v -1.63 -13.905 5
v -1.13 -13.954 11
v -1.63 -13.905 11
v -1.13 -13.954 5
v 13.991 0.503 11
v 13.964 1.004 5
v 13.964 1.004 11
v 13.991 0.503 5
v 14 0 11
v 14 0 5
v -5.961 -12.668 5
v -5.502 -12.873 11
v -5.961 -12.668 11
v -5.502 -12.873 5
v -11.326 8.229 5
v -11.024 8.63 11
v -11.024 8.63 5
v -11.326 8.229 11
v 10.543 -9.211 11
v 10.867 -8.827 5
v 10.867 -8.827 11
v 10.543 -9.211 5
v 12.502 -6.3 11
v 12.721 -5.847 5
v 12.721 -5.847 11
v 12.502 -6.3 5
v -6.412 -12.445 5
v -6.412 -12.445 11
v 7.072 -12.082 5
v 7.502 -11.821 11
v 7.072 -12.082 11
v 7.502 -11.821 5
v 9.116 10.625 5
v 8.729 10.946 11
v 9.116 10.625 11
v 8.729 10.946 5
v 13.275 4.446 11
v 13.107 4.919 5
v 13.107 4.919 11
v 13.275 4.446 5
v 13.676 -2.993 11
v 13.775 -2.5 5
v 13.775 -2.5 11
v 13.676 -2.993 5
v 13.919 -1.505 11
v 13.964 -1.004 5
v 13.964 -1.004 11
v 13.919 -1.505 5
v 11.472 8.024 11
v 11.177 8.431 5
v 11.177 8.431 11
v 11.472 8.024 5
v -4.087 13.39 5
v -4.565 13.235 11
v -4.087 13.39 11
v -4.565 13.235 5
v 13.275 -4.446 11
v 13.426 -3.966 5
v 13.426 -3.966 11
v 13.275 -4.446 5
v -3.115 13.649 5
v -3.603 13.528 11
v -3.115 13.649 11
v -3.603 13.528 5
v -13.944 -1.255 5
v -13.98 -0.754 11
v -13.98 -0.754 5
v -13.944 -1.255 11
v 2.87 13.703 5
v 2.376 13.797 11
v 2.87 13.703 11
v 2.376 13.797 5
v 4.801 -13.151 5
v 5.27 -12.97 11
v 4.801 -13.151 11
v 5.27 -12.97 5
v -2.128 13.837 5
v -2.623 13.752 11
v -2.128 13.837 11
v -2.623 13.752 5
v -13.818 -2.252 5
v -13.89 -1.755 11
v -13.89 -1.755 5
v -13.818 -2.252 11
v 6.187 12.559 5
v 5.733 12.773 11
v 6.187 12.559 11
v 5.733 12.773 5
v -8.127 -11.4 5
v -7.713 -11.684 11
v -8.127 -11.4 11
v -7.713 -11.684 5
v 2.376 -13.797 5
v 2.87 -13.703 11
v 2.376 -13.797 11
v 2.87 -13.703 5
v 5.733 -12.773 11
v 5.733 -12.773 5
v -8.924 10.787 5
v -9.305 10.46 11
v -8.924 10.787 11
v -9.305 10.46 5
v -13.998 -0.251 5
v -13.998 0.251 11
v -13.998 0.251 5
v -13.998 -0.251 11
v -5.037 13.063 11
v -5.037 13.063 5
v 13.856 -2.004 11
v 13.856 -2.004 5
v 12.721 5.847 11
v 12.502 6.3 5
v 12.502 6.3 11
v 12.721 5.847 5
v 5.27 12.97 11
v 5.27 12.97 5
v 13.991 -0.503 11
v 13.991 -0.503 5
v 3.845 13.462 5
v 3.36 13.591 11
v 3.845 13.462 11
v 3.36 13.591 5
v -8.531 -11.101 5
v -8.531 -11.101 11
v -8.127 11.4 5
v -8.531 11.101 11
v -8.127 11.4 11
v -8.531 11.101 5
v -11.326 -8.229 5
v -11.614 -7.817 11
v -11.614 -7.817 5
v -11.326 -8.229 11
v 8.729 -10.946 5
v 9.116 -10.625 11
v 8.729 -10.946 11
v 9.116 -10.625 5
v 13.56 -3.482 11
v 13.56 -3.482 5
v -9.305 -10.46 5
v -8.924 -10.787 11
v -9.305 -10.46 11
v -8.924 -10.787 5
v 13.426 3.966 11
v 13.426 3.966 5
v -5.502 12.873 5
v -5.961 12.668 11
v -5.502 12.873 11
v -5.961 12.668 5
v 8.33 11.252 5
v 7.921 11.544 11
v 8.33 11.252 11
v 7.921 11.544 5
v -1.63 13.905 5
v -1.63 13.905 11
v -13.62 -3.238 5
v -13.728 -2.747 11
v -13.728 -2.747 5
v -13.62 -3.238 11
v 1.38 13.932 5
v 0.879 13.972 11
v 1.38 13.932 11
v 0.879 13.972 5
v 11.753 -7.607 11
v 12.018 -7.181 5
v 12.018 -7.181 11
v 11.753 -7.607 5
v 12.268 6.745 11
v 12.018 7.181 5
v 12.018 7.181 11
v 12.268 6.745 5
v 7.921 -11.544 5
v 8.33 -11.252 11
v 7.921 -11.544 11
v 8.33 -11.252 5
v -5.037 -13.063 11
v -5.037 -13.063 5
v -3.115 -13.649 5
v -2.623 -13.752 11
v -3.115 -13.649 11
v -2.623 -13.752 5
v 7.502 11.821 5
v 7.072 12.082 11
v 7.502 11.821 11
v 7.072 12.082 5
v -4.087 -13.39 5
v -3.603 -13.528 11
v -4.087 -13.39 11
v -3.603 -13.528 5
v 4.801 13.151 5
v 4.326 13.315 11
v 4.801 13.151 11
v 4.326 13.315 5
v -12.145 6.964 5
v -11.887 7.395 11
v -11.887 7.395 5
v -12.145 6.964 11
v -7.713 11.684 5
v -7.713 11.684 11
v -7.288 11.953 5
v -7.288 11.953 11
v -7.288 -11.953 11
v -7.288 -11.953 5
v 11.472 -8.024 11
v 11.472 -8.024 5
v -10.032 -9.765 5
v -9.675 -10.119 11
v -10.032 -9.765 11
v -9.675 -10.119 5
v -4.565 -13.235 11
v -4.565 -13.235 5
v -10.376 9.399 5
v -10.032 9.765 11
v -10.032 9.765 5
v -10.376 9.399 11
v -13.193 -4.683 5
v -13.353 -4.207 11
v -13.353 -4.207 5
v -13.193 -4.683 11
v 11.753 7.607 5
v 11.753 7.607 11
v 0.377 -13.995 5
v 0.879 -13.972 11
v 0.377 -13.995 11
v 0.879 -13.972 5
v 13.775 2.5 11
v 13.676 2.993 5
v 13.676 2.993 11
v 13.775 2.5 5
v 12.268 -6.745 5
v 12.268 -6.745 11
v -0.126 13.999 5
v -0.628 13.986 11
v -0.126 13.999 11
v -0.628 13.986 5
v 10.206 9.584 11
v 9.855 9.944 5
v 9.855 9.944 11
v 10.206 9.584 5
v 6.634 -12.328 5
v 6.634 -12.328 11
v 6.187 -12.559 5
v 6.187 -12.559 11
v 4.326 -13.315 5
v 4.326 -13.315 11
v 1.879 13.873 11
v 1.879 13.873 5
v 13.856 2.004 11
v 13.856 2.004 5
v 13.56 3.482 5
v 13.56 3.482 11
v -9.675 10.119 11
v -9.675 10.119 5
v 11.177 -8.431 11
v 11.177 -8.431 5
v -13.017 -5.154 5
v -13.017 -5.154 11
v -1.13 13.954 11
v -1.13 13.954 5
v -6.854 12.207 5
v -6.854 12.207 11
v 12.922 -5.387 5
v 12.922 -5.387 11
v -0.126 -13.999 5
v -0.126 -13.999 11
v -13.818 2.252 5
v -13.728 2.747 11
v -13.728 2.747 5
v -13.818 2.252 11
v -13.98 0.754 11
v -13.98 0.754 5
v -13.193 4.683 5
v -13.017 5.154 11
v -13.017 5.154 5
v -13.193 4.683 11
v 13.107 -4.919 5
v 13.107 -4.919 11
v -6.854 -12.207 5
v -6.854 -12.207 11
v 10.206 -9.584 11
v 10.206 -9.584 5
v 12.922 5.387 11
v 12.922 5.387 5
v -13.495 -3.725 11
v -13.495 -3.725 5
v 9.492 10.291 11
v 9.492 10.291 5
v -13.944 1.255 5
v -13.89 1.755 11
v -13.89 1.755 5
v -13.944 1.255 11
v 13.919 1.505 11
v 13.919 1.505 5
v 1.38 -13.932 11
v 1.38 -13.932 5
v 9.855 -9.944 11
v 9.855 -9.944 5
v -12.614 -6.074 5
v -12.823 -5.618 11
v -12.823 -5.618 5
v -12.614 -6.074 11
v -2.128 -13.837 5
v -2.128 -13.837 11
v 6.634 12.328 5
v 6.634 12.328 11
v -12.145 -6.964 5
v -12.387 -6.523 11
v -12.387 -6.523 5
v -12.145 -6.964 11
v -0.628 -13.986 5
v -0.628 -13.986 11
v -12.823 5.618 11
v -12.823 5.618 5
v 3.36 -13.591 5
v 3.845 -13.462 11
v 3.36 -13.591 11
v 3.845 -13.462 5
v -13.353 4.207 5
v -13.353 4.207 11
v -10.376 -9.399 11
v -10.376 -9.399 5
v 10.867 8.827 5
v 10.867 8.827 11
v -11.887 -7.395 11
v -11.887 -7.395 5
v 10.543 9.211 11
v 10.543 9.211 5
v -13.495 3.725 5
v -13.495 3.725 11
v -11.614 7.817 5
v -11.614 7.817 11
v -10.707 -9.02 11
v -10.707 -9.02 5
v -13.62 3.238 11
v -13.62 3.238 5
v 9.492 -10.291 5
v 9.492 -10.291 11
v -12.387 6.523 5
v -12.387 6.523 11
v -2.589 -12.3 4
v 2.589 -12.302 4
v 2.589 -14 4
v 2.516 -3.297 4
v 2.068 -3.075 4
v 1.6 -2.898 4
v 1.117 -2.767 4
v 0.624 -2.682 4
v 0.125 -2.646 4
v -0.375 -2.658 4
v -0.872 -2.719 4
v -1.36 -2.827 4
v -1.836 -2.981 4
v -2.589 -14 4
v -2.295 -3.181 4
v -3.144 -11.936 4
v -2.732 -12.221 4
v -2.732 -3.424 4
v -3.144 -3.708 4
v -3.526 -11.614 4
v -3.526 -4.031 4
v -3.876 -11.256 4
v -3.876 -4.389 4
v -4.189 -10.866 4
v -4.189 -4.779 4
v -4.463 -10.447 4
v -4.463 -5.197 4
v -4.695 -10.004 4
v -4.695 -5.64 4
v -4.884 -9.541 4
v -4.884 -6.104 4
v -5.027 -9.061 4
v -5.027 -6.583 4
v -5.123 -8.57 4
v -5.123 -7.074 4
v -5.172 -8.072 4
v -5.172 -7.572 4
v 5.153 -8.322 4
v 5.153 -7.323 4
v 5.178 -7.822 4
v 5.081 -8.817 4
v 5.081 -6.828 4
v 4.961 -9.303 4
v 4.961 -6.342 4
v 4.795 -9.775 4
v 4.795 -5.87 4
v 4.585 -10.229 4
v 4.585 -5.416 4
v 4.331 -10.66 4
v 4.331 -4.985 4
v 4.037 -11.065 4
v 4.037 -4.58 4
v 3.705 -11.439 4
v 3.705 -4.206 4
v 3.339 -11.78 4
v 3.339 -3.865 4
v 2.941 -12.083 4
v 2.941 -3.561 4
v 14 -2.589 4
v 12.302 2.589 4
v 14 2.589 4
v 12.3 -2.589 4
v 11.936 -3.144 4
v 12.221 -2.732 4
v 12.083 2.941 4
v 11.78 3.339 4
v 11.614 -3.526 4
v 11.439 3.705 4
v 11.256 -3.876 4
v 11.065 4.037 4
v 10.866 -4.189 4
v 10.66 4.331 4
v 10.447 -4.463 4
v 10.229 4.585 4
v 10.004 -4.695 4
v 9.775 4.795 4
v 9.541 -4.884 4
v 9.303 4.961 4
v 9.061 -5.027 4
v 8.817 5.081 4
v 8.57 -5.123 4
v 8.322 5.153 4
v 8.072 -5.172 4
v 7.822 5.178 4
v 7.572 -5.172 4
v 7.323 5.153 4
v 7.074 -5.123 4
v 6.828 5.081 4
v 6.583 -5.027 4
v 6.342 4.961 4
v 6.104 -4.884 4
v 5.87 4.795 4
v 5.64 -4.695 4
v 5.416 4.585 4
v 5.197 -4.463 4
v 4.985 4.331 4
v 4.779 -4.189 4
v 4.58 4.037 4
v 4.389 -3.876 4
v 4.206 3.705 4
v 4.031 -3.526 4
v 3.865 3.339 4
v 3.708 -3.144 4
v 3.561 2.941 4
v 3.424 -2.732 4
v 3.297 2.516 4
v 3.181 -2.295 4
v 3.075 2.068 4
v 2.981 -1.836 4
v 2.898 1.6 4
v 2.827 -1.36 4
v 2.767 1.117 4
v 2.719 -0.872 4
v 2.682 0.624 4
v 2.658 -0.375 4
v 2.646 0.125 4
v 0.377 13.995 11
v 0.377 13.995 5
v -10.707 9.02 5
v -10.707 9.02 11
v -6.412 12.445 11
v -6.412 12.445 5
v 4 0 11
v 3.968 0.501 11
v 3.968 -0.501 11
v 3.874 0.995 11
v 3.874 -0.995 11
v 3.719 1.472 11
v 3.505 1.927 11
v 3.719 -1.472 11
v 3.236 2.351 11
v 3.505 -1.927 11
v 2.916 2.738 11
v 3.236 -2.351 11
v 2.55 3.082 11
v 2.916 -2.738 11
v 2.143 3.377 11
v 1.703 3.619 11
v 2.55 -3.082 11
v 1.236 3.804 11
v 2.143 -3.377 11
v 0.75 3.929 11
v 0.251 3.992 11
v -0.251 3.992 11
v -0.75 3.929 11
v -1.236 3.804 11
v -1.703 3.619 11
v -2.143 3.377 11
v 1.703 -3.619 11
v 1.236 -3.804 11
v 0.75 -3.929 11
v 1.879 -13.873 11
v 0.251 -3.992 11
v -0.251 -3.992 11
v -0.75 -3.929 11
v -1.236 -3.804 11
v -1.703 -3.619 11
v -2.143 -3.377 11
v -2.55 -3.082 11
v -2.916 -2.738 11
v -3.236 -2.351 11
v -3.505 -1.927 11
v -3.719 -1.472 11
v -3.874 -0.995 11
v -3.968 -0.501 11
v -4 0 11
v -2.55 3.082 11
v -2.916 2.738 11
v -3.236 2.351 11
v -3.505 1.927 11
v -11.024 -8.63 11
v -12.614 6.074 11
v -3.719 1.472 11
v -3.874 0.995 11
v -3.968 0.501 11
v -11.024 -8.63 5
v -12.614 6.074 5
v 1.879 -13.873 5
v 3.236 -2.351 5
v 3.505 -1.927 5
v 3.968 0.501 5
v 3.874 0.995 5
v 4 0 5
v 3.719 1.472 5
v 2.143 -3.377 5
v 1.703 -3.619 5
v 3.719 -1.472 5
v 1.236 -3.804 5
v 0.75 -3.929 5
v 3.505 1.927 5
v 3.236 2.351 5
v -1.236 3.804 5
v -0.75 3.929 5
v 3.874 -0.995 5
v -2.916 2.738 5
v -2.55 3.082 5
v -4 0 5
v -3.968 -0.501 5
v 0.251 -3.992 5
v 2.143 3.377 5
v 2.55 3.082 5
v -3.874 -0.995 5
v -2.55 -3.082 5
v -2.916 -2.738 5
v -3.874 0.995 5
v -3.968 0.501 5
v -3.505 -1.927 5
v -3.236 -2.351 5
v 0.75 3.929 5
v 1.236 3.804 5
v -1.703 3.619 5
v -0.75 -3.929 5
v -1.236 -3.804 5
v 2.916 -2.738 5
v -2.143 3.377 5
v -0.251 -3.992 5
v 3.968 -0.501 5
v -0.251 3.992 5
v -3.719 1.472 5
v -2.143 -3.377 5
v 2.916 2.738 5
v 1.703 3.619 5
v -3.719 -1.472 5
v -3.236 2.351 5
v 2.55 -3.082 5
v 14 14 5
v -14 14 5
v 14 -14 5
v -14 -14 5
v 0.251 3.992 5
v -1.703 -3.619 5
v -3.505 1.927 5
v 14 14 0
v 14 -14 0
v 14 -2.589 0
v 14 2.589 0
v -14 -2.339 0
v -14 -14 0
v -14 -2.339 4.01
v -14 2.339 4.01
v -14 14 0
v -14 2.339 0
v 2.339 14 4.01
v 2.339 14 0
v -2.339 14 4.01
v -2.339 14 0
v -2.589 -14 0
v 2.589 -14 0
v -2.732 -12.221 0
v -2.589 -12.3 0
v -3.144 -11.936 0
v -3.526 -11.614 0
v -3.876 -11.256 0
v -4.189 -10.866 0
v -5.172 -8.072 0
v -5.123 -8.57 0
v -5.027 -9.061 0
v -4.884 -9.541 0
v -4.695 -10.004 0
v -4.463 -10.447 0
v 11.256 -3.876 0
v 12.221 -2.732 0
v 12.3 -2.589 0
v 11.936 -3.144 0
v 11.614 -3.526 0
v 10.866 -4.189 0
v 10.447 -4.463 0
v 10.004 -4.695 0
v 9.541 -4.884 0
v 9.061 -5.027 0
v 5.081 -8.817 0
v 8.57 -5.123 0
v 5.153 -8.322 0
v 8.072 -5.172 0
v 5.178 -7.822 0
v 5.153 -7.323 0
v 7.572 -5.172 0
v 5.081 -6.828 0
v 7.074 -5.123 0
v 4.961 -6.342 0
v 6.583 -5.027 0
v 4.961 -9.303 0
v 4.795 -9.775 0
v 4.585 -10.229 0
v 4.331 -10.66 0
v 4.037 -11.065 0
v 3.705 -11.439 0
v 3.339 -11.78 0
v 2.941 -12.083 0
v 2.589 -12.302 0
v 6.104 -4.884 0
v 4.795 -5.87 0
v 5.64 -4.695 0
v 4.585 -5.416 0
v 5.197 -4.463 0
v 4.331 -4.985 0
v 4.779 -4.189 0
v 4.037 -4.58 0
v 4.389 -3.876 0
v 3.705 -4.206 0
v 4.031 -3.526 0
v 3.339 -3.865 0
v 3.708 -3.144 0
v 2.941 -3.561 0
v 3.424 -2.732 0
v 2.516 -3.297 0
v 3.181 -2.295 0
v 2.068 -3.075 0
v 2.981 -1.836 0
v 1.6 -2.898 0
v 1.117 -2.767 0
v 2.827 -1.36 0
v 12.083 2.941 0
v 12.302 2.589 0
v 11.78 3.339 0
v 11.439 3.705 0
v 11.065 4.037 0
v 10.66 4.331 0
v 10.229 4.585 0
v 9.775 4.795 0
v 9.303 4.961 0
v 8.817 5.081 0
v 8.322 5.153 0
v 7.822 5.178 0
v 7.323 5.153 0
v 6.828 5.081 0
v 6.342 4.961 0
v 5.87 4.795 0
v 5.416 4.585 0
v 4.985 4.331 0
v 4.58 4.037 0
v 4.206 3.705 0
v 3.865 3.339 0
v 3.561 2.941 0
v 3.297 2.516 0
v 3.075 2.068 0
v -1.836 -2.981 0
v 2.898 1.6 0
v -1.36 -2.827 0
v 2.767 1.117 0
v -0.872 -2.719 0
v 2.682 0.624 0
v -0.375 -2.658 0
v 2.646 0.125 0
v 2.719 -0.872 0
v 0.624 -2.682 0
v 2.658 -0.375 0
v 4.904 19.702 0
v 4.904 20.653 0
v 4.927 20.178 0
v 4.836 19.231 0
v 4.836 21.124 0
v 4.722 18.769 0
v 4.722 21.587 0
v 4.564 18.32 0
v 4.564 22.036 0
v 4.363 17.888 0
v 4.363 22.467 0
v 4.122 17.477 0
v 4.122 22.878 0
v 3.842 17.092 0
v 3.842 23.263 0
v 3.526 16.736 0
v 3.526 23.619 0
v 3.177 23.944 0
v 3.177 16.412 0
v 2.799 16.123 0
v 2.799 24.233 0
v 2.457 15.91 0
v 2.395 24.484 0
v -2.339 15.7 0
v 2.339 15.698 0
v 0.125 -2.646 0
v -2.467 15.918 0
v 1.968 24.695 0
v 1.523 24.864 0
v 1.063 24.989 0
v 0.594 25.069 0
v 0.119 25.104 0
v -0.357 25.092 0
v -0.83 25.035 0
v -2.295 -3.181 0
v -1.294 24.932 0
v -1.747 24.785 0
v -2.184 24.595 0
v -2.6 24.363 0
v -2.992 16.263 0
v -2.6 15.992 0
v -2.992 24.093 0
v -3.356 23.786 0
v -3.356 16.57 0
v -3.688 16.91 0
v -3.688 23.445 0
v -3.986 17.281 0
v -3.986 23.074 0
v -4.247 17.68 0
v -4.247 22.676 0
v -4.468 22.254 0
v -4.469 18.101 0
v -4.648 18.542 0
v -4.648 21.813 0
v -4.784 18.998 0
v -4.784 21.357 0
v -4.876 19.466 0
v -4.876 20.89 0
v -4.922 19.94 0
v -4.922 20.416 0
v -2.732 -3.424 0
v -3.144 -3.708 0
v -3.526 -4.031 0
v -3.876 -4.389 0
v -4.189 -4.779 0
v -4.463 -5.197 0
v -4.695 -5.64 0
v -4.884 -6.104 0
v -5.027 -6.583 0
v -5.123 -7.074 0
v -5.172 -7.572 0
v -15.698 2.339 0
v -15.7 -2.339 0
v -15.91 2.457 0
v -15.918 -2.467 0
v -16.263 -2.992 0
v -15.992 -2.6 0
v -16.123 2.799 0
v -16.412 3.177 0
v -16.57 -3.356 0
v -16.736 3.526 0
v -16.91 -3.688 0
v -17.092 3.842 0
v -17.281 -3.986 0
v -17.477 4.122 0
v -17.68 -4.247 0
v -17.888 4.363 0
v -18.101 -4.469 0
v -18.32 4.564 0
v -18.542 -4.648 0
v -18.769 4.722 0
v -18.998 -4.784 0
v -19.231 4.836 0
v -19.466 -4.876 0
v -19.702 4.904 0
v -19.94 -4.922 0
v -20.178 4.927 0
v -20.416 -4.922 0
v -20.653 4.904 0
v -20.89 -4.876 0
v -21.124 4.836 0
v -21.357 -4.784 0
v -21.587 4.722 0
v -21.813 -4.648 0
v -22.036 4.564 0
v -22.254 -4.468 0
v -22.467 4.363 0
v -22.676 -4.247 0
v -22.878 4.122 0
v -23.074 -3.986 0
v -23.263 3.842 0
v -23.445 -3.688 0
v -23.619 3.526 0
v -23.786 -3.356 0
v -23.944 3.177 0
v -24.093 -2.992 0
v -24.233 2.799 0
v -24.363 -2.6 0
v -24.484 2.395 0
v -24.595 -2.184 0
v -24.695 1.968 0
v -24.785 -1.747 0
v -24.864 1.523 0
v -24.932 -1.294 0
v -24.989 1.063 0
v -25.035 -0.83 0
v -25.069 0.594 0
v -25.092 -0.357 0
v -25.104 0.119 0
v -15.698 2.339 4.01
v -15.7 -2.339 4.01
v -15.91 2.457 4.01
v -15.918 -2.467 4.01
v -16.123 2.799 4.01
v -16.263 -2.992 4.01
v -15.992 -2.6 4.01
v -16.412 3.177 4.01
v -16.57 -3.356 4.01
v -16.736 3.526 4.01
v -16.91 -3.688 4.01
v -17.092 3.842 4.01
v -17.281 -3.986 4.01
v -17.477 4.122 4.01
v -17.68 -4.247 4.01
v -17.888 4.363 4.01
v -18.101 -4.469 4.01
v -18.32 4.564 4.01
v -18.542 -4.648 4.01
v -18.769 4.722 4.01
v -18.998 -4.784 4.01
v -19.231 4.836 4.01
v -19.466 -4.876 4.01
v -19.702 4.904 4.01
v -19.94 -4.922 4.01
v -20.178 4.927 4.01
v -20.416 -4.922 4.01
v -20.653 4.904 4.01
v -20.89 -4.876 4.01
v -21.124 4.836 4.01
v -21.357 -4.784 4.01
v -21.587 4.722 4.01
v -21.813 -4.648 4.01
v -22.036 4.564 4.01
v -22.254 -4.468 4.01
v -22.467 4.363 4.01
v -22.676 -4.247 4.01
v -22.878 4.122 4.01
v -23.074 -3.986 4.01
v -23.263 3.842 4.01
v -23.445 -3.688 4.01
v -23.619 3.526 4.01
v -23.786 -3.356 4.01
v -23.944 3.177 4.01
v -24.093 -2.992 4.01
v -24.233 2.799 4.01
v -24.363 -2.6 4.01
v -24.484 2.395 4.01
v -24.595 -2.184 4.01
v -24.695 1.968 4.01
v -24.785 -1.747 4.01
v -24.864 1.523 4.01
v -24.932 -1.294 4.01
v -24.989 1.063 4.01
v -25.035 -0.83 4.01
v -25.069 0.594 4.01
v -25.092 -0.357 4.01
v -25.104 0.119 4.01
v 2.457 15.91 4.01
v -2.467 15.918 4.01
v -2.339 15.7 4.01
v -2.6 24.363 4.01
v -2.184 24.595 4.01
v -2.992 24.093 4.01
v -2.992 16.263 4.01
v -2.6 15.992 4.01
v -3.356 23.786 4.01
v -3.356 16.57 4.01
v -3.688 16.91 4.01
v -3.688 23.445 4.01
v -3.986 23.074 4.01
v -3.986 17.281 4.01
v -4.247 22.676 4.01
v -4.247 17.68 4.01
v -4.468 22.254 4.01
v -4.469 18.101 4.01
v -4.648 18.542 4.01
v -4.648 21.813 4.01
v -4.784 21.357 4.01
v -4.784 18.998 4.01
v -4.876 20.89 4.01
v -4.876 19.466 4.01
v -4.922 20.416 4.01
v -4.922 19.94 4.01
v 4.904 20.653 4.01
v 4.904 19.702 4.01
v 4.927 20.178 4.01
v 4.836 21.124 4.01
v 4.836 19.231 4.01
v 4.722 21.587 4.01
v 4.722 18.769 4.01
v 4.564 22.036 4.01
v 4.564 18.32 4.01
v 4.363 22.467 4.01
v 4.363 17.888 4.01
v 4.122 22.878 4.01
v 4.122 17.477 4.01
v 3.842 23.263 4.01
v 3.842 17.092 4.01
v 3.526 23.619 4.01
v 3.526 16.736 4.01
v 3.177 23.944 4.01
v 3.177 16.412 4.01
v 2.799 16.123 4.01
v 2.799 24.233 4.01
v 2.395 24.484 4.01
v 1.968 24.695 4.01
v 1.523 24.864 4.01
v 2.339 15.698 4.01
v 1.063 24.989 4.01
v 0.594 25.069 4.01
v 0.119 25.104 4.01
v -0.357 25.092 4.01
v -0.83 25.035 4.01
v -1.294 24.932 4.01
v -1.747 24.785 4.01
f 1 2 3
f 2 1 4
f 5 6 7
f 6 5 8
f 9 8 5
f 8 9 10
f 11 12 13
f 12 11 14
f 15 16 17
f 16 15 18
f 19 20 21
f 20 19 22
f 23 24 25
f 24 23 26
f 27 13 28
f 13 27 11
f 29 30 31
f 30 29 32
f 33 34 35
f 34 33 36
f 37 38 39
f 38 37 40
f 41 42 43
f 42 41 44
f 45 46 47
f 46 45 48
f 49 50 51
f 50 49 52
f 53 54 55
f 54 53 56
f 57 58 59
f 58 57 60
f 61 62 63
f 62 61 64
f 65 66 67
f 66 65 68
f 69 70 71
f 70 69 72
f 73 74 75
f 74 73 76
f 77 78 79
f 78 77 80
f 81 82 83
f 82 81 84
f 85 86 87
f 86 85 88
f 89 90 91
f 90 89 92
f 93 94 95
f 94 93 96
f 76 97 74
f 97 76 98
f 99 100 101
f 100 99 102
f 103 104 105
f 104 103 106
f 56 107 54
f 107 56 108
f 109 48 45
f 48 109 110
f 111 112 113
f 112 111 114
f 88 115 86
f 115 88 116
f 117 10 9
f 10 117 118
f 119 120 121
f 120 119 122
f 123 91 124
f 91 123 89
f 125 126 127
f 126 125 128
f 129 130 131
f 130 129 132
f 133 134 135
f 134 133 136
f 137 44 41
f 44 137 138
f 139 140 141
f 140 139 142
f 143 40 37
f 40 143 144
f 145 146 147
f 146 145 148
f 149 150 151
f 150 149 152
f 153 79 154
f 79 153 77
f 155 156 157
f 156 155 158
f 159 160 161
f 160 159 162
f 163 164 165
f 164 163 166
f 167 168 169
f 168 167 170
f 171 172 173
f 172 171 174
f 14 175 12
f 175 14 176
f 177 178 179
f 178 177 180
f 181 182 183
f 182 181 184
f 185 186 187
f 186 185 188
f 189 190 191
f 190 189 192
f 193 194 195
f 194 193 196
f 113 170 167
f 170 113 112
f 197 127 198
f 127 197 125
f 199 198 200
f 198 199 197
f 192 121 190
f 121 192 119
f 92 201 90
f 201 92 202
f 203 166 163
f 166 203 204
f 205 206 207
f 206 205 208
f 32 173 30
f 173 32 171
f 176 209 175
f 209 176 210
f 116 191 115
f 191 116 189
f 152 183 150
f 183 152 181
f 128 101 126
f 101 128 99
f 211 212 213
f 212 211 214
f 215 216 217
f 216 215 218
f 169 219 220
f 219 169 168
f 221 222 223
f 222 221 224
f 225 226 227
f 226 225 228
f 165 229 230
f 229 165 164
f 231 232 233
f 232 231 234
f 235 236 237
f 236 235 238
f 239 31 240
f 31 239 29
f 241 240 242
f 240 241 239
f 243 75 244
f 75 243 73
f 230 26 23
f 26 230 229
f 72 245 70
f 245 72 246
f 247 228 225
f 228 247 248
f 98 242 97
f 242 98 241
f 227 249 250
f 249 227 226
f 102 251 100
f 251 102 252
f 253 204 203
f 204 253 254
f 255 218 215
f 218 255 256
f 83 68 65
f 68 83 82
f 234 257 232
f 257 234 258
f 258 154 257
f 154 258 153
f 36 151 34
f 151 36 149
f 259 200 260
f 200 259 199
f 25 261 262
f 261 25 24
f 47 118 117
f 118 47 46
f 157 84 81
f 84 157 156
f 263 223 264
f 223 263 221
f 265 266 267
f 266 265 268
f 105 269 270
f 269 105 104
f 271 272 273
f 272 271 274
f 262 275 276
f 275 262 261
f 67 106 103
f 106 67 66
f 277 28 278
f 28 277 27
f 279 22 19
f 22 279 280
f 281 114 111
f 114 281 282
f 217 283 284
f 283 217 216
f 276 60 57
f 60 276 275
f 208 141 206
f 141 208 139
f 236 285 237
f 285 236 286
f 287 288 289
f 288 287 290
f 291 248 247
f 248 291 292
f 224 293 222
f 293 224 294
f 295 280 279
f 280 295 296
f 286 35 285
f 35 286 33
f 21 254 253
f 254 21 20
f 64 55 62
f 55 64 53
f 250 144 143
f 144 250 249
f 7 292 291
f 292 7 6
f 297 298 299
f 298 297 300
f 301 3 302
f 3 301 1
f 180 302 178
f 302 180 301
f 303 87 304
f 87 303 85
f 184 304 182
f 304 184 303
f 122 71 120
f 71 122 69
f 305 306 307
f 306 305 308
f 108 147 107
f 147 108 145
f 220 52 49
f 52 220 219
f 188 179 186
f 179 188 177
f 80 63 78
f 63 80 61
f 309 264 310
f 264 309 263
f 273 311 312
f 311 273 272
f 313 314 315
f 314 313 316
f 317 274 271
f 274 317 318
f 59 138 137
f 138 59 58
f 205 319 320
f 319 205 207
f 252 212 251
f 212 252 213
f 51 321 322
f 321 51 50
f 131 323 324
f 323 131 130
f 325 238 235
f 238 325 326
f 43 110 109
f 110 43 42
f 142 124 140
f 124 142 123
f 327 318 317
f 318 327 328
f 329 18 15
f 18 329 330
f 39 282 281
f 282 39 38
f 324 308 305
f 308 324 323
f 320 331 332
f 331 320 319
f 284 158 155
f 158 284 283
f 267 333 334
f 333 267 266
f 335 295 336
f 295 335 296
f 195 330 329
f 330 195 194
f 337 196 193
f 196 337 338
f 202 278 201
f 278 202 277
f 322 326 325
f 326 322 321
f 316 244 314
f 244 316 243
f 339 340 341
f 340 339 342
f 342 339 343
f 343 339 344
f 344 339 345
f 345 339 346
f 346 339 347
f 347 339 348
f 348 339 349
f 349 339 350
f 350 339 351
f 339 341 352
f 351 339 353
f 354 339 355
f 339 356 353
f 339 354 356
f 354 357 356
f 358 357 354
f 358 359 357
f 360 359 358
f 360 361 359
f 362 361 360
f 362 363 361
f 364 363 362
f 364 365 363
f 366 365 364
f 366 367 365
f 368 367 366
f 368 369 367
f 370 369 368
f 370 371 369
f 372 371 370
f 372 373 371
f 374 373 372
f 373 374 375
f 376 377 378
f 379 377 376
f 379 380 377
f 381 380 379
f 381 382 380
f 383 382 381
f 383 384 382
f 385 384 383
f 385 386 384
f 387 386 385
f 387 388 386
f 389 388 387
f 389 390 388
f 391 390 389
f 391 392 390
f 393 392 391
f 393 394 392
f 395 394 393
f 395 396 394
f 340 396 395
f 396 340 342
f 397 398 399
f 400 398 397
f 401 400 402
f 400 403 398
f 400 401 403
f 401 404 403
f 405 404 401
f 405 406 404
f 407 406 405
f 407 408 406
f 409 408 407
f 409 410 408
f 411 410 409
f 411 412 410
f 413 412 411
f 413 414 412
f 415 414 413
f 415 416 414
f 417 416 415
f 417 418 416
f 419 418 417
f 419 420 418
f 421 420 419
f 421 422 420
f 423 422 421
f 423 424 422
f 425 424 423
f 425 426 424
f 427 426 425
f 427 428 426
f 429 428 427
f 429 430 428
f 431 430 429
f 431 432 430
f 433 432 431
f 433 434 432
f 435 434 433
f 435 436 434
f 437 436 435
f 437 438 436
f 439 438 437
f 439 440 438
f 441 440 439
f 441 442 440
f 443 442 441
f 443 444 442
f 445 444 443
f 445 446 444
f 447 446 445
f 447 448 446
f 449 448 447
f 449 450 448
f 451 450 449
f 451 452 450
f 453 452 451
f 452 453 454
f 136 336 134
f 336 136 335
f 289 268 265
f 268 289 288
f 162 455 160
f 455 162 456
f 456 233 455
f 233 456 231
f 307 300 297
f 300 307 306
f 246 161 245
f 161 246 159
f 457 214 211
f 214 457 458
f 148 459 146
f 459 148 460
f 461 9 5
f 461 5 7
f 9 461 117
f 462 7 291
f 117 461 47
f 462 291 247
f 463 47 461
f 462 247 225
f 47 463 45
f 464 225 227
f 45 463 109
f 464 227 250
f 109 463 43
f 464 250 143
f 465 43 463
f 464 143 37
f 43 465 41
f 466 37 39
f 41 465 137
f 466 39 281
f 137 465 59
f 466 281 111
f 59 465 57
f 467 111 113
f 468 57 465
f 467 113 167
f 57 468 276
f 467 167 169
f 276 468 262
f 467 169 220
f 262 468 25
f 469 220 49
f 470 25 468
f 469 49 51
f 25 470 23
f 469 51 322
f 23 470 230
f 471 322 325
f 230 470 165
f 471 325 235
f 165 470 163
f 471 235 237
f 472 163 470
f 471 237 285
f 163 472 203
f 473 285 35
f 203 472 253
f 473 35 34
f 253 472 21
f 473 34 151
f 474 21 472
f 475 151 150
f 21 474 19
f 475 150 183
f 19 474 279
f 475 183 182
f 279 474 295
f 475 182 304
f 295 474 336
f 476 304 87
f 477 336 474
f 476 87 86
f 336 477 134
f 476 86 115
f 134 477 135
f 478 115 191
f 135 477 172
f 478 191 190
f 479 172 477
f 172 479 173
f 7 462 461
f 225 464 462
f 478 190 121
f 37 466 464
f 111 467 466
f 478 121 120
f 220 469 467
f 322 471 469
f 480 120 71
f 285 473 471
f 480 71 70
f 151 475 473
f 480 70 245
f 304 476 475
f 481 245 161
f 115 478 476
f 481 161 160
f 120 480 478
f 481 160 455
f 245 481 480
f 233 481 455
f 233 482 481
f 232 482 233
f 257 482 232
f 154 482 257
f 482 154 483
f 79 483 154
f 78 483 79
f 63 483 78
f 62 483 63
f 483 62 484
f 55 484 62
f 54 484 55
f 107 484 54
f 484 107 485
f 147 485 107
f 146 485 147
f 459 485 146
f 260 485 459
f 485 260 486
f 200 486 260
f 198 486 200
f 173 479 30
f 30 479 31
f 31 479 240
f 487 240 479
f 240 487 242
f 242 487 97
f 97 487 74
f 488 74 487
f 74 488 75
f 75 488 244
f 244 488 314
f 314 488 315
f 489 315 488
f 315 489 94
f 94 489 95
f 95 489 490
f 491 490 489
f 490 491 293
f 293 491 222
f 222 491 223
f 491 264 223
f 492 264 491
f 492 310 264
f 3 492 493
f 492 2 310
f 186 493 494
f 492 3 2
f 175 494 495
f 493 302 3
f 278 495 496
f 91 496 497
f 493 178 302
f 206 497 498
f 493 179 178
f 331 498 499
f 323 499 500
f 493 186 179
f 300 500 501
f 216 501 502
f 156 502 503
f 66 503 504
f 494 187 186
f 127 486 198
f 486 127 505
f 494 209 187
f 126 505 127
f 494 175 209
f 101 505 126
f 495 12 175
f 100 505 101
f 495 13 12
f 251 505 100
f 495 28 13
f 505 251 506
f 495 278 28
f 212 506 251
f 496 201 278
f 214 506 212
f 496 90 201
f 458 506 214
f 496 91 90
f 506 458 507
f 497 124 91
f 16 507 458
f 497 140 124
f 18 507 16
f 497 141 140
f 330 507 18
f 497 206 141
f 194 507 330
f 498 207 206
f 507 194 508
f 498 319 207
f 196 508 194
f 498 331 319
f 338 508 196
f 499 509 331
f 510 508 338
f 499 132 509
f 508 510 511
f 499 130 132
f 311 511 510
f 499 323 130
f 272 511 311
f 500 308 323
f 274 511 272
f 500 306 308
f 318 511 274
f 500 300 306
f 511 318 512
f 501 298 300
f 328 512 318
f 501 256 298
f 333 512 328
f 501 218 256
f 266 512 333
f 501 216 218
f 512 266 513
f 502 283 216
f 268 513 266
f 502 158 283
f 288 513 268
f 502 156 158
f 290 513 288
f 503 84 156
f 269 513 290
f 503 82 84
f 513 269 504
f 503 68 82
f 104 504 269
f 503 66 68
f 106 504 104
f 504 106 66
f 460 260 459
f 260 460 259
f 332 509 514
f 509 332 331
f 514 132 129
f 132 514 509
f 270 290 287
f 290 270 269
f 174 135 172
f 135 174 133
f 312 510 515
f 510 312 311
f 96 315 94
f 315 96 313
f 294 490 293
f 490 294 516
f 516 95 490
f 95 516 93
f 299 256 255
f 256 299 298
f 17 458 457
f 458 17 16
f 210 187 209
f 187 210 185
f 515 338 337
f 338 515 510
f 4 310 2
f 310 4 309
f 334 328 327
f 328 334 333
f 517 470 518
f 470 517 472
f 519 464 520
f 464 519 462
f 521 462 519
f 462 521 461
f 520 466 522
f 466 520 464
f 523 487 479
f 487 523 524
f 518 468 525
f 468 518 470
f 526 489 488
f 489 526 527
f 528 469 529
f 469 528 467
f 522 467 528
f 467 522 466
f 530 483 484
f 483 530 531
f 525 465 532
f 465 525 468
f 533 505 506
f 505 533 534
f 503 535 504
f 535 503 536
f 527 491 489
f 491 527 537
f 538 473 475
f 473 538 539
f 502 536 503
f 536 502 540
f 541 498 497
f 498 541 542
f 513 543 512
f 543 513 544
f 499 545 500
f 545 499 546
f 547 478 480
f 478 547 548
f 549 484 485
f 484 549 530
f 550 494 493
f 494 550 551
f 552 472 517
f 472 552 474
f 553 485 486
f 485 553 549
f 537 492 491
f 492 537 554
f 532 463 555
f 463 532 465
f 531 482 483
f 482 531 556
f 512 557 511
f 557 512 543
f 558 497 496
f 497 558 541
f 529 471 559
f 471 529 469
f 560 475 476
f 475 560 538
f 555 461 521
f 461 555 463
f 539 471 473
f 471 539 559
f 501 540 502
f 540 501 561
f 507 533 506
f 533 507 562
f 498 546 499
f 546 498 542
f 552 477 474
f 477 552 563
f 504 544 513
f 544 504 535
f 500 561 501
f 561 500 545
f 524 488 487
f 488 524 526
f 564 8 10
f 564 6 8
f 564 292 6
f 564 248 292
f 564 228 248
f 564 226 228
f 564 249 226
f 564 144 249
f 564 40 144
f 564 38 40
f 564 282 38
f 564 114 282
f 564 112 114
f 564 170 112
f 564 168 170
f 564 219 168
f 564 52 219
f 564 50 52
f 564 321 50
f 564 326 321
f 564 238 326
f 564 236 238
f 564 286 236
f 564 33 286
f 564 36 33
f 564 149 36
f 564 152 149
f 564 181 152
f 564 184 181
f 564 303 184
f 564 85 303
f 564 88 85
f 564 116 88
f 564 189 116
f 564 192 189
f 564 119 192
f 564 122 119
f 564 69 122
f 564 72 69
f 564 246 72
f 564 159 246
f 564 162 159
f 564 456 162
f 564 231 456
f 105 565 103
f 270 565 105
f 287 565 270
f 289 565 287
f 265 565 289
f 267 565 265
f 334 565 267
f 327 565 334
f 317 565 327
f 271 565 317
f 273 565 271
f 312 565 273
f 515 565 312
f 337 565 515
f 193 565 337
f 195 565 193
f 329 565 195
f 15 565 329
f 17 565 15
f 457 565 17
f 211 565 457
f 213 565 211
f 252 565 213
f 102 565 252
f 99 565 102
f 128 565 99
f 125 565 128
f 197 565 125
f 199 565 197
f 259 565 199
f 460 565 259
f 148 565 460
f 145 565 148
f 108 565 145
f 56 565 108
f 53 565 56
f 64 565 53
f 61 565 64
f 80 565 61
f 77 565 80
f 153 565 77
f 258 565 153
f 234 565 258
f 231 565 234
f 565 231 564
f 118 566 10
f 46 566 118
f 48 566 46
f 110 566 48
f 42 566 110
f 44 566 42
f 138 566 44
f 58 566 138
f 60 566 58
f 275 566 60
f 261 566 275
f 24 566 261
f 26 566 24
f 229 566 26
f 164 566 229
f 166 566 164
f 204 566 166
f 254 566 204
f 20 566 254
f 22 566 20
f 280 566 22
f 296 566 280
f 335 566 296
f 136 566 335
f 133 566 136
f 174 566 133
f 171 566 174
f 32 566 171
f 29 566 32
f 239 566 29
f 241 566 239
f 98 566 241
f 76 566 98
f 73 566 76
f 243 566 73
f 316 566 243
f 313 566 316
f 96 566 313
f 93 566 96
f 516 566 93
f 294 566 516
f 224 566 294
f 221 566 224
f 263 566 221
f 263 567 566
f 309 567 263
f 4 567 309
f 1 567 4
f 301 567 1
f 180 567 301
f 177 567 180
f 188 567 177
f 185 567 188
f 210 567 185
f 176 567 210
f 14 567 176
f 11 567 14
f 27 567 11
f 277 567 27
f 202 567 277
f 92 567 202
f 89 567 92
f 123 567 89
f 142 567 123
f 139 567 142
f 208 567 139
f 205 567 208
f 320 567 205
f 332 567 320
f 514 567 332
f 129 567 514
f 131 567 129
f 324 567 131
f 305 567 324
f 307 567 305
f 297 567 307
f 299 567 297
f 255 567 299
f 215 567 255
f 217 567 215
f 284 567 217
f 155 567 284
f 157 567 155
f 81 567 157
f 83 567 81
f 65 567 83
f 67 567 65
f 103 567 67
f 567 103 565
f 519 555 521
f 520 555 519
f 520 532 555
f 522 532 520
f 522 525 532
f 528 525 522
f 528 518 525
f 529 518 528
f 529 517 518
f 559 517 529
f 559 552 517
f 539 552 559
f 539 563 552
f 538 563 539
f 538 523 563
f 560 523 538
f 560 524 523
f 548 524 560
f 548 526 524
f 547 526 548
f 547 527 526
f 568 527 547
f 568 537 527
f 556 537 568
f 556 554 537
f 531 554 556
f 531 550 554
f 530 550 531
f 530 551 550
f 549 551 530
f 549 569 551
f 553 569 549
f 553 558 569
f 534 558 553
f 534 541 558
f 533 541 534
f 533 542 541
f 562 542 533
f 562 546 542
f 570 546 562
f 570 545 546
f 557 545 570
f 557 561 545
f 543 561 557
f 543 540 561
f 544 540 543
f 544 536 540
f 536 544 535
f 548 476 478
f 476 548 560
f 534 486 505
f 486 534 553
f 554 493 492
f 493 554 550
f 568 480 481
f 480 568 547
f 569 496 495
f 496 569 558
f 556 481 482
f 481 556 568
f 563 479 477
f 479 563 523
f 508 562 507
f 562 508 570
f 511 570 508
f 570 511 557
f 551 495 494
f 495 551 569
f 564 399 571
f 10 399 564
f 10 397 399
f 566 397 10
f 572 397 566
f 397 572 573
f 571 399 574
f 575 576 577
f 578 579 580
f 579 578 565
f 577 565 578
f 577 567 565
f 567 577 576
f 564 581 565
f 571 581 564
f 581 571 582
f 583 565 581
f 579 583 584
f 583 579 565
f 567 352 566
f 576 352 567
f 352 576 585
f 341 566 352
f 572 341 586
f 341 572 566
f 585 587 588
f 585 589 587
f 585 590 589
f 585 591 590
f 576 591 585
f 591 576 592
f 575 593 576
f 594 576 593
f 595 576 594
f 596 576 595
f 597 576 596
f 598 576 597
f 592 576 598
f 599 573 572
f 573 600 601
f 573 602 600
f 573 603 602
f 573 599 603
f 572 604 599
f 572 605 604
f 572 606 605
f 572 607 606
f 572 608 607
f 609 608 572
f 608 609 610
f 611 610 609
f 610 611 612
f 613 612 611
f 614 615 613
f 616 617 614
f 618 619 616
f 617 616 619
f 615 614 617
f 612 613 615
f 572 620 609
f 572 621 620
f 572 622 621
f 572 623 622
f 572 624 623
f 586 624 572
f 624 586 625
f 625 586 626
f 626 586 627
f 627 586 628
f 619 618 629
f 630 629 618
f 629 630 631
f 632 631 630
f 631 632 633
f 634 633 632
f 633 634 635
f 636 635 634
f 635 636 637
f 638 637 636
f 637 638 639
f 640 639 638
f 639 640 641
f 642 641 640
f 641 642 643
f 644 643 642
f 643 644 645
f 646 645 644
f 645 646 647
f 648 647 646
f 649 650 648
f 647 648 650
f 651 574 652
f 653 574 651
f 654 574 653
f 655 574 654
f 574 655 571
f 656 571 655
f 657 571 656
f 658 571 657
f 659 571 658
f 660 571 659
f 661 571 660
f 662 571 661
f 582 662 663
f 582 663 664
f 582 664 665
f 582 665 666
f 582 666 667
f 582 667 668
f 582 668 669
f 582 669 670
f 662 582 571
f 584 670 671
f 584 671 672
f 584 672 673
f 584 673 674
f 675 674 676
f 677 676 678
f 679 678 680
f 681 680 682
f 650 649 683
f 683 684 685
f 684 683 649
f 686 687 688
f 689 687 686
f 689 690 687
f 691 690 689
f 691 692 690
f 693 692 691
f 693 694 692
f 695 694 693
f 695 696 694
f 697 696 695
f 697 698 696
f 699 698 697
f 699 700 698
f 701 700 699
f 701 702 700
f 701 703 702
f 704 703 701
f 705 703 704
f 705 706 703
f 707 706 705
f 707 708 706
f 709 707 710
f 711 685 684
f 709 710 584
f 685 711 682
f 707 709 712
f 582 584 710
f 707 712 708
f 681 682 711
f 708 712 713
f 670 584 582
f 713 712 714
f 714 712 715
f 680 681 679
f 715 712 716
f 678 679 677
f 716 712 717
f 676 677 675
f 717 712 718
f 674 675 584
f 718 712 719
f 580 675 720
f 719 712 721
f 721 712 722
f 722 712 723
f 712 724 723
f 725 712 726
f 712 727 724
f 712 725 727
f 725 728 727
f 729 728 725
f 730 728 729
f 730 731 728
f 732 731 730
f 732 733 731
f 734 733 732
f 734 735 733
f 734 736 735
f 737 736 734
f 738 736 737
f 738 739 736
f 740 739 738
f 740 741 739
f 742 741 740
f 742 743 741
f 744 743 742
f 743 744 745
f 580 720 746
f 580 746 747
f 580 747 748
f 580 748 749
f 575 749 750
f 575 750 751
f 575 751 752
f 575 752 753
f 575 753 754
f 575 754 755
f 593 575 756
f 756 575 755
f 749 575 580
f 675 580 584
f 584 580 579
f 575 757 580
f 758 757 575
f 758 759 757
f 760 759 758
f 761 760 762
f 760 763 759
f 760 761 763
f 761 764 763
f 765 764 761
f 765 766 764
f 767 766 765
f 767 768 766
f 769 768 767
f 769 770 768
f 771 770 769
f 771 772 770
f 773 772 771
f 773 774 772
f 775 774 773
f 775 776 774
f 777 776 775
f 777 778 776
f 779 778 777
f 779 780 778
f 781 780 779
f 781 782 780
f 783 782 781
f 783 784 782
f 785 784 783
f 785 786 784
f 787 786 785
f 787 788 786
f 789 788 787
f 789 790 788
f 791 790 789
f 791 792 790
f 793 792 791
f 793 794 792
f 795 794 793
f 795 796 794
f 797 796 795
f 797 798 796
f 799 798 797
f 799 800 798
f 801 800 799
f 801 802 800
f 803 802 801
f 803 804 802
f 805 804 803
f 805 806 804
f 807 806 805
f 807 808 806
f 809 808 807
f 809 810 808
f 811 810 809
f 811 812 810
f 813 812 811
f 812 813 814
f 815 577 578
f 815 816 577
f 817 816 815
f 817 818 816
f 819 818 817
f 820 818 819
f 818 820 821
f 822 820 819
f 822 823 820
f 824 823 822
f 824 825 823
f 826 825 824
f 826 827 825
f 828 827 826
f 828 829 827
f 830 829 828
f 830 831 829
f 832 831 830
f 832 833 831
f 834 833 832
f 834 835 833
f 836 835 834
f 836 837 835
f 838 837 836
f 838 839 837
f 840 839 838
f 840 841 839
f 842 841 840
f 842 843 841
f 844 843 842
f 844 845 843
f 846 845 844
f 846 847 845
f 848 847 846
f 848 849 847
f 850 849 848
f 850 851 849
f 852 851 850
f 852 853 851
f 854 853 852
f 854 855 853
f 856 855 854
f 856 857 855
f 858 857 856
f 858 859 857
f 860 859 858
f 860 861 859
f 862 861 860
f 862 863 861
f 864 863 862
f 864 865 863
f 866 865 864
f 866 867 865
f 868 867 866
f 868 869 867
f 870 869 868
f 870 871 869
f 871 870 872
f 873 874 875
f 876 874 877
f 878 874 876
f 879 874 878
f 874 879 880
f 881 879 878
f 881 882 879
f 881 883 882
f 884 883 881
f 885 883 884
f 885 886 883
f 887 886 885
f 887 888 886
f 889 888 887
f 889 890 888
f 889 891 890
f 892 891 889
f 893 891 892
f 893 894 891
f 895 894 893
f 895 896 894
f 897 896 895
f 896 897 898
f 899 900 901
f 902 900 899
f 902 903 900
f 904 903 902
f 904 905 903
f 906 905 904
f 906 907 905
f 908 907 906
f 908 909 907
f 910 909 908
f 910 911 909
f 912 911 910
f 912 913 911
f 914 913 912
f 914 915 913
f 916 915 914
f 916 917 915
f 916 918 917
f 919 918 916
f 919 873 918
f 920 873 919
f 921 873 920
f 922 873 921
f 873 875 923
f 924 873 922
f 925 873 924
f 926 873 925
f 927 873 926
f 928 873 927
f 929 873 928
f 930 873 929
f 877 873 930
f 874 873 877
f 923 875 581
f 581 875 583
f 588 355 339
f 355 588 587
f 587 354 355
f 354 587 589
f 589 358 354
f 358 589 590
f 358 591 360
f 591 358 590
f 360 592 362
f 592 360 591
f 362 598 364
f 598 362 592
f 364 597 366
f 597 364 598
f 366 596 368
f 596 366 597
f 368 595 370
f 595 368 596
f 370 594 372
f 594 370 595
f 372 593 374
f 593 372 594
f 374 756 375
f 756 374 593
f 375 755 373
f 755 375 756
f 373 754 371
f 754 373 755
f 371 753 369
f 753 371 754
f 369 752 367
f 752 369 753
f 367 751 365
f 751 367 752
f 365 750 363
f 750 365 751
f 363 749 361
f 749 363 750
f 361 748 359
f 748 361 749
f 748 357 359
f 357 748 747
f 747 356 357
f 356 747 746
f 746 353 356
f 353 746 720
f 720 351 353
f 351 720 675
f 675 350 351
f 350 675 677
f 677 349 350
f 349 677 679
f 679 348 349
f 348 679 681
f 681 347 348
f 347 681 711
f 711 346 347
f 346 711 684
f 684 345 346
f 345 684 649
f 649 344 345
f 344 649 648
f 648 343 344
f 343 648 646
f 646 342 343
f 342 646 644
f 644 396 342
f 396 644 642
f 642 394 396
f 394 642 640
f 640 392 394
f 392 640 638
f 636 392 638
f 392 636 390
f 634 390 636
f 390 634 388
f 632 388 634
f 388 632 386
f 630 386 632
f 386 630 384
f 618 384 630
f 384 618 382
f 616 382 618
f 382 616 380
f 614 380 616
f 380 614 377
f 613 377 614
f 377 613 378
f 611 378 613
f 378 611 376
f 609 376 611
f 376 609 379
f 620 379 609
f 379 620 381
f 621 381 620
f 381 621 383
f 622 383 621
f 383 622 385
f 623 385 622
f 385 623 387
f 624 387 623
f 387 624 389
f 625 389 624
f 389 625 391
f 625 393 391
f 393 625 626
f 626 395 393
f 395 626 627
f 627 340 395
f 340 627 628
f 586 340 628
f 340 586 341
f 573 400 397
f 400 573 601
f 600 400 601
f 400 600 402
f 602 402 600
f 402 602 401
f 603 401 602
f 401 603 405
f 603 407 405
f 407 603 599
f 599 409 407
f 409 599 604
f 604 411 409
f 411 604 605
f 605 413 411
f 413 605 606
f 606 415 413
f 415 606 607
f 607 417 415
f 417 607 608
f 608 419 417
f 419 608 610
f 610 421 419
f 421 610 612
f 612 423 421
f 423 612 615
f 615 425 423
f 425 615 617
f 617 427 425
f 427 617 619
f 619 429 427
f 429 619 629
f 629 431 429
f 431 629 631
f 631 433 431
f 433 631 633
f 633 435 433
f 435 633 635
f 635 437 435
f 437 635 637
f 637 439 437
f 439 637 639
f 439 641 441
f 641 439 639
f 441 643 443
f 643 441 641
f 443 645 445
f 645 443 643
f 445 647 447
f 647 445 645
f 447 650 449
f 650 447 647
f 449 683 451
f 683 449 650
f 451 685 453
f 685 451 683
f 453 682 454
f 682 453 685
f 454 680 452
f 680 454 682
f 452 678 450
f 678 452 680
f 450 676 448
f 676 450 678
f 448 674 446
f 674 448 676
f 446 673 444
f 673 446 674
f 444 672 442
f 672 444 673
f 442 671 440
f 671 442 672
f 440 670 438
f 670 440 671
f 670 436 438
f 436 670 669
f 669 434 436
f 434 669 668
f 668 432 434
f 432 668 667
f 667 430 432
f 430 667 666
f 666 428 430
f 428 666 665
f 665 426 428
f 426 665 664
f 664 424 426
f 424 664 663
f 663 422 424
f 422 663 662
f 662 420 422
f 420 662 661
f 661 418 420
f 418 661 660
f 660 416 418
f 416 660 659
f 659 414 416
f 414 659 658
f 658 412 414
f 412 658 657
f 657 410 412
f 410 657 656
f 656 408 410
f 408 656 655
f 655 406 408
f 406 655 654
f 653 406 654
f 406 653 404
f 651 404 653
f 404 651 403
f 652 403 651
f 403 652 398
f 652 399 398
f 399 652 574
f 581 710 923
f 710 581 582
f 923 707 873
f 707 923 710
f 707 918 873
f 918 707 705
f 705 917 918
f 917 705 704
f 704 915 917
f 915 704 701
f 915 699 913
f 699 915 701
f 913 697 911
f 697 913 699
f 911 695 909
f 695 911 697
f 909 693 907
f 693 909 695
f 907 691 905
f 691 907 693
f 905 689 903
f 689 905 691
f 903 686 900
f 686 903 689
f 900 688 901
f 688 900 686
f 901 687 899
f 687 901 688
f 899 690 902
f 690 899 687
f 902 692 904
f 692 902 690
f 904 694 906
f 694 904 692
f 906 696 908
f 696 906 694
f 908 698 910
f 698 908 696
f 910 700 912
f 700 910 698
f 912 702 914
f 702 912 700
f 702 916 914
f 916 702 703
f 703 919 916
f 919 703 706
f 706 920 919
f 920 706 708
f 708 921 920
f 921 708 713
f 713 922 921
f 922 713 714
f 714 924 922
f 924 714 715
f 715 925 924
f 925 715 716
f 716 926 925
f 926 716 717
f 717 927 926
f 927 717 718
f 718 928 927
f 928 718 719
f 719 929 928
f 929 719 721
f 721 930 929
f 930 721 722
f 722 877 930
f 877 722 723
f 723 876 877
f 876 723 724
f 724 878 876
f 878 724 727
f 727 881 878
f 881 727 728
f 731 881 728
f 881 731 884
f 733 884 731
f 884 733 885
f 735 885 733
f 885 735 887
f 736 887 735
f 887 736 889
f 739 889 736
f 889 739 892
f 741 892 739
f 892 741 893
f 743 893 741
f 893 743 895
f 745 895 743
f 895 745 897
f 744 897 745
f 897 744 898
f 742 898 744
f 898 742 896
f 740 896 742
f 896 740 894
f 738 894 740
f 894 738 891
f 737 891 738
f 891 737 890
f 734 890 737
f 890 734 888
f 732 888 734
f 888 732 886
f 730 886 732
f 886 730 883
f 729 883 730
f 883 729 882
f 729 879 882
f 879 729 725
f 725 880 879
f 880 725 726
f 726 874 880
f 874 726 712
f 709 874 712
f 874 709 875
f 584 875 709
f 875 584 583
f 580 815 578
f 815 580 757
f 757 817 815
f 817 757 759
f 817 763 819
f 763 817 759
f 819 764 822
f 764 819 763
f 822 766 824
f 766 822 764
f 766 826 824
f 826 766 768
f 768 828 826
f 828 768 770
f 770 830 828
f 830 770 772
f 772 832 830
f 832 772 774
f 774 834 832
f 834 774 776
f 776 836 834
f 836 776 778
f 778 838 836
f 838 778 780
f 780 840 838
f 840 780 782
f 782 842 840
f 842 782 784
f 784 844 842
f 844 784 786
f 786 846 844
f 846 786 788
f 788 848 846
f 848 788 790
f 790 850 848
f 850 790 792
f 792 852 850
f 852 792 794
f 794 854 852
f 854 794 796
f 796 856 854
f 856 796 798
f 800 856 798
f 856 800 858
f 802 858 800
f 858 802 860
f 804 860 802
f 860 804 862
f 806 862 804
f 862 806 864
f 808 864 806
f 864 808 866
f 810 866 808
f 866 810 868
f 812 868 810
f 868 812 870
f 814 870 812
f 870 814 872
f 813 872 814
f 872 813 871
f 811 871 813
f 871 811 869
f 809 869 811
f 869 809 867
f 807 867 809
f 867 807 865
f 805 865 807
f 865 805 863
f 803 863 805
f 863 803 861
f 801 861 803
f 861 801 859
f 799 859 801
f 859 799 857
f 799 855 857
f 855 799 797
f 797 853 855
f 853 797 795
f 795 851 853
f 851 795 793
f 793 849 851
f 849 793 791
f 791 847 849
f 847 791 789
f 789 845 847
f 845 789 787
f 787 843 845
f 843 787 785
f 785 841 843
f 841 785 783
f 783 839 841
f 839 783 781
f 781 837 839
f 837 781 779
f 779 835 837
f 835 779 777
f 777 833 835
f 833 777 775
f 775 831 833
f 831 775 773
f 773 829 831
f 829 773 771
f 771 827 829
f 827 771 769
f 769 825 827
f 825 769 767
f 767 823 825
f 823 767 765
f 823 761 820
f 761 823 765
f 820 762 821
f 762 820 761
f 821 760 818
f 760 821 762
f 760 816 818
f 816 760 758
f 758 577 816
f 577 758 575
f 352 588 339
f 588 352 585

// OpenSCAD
// height of the jigsaw layer, mm
h_jigsaw = 4;
// diameter of the atomizer threads
d_thread = 8;
// length of the atomizer threads
l_thread = 6;
// maximum diameter of the atomizer we're going to accomodate
d_tank = 28;


/* [Hidden] */
layer_height=.2; extrusion_width=.5;
epsilon=.01;

module piece(
 h_jigsaw = 4,
 l_thread = 5+1,
 d_thread = 7+1,
 d_tank = 28,
 l_jigsaw = 2.5,
 s_z = layer_height*5,
 s_xy = extrusion_width*2,
 tolerance_xy = extrusion_width/2,
 tolerance_z = layer_height*2, /* TODO: not implemented */
) {
 fnd=PI*2; fnr=2*fnd;
 
 w = d_tank;
 
 offset_jigsaw = s_xy;
 r_jigsaw = (w/2-offset_jigsaw-s_xy/2)*sin(45)/(1+sin(45));
 w_jigsaw = r_jigsaw;
 y_jigsaw = offset_jigsaw+r_jigsaw;
 
 module js_profile(l_extra=1) {
  translate([-w_jigsaw/2,-l_extra])
  square([w_jigsaw,y_jigsaw+l_extra]);
  translate([0,y_jigsaw])
  circle(r=r_jigsaw,$fn=r_jigsaw*fnr);
 }
 module profile() {
  difference() {
   square([w,w],center=true);
   for(zr=[0,90]) rotate([0,0,zr])
   translate([-0,-w/2]) js_profile();
  }
  for(zr=[0,90]) rotate([0,0,zr])
  translate([0,w/2]) offset(r=-tolerance_xy) js_profile();
 }
 
 linear_extrude(height=h_jigsaw+epsilon,convexity=16)
 profile();
 translate([0,0,h_jigsaw]) {
  translate([-w/2,-w/2,0]) cube(size=[w,w,s_z]);
  difference() {
   cylinder(d=d_tank,h=s_z+l_thread,$fn=d_tank*fnd);
   translate([0,0,s_z])
   cylinder(d=d_thread,h=l_thread+1,$fn=d_thread*fnd);
  }
 }

}

piece(
 h_jigsaw = h_jigsaw,
 d_thread = d_thread,
 l_thread = l_thread,
 d_tank = d_tank
);
